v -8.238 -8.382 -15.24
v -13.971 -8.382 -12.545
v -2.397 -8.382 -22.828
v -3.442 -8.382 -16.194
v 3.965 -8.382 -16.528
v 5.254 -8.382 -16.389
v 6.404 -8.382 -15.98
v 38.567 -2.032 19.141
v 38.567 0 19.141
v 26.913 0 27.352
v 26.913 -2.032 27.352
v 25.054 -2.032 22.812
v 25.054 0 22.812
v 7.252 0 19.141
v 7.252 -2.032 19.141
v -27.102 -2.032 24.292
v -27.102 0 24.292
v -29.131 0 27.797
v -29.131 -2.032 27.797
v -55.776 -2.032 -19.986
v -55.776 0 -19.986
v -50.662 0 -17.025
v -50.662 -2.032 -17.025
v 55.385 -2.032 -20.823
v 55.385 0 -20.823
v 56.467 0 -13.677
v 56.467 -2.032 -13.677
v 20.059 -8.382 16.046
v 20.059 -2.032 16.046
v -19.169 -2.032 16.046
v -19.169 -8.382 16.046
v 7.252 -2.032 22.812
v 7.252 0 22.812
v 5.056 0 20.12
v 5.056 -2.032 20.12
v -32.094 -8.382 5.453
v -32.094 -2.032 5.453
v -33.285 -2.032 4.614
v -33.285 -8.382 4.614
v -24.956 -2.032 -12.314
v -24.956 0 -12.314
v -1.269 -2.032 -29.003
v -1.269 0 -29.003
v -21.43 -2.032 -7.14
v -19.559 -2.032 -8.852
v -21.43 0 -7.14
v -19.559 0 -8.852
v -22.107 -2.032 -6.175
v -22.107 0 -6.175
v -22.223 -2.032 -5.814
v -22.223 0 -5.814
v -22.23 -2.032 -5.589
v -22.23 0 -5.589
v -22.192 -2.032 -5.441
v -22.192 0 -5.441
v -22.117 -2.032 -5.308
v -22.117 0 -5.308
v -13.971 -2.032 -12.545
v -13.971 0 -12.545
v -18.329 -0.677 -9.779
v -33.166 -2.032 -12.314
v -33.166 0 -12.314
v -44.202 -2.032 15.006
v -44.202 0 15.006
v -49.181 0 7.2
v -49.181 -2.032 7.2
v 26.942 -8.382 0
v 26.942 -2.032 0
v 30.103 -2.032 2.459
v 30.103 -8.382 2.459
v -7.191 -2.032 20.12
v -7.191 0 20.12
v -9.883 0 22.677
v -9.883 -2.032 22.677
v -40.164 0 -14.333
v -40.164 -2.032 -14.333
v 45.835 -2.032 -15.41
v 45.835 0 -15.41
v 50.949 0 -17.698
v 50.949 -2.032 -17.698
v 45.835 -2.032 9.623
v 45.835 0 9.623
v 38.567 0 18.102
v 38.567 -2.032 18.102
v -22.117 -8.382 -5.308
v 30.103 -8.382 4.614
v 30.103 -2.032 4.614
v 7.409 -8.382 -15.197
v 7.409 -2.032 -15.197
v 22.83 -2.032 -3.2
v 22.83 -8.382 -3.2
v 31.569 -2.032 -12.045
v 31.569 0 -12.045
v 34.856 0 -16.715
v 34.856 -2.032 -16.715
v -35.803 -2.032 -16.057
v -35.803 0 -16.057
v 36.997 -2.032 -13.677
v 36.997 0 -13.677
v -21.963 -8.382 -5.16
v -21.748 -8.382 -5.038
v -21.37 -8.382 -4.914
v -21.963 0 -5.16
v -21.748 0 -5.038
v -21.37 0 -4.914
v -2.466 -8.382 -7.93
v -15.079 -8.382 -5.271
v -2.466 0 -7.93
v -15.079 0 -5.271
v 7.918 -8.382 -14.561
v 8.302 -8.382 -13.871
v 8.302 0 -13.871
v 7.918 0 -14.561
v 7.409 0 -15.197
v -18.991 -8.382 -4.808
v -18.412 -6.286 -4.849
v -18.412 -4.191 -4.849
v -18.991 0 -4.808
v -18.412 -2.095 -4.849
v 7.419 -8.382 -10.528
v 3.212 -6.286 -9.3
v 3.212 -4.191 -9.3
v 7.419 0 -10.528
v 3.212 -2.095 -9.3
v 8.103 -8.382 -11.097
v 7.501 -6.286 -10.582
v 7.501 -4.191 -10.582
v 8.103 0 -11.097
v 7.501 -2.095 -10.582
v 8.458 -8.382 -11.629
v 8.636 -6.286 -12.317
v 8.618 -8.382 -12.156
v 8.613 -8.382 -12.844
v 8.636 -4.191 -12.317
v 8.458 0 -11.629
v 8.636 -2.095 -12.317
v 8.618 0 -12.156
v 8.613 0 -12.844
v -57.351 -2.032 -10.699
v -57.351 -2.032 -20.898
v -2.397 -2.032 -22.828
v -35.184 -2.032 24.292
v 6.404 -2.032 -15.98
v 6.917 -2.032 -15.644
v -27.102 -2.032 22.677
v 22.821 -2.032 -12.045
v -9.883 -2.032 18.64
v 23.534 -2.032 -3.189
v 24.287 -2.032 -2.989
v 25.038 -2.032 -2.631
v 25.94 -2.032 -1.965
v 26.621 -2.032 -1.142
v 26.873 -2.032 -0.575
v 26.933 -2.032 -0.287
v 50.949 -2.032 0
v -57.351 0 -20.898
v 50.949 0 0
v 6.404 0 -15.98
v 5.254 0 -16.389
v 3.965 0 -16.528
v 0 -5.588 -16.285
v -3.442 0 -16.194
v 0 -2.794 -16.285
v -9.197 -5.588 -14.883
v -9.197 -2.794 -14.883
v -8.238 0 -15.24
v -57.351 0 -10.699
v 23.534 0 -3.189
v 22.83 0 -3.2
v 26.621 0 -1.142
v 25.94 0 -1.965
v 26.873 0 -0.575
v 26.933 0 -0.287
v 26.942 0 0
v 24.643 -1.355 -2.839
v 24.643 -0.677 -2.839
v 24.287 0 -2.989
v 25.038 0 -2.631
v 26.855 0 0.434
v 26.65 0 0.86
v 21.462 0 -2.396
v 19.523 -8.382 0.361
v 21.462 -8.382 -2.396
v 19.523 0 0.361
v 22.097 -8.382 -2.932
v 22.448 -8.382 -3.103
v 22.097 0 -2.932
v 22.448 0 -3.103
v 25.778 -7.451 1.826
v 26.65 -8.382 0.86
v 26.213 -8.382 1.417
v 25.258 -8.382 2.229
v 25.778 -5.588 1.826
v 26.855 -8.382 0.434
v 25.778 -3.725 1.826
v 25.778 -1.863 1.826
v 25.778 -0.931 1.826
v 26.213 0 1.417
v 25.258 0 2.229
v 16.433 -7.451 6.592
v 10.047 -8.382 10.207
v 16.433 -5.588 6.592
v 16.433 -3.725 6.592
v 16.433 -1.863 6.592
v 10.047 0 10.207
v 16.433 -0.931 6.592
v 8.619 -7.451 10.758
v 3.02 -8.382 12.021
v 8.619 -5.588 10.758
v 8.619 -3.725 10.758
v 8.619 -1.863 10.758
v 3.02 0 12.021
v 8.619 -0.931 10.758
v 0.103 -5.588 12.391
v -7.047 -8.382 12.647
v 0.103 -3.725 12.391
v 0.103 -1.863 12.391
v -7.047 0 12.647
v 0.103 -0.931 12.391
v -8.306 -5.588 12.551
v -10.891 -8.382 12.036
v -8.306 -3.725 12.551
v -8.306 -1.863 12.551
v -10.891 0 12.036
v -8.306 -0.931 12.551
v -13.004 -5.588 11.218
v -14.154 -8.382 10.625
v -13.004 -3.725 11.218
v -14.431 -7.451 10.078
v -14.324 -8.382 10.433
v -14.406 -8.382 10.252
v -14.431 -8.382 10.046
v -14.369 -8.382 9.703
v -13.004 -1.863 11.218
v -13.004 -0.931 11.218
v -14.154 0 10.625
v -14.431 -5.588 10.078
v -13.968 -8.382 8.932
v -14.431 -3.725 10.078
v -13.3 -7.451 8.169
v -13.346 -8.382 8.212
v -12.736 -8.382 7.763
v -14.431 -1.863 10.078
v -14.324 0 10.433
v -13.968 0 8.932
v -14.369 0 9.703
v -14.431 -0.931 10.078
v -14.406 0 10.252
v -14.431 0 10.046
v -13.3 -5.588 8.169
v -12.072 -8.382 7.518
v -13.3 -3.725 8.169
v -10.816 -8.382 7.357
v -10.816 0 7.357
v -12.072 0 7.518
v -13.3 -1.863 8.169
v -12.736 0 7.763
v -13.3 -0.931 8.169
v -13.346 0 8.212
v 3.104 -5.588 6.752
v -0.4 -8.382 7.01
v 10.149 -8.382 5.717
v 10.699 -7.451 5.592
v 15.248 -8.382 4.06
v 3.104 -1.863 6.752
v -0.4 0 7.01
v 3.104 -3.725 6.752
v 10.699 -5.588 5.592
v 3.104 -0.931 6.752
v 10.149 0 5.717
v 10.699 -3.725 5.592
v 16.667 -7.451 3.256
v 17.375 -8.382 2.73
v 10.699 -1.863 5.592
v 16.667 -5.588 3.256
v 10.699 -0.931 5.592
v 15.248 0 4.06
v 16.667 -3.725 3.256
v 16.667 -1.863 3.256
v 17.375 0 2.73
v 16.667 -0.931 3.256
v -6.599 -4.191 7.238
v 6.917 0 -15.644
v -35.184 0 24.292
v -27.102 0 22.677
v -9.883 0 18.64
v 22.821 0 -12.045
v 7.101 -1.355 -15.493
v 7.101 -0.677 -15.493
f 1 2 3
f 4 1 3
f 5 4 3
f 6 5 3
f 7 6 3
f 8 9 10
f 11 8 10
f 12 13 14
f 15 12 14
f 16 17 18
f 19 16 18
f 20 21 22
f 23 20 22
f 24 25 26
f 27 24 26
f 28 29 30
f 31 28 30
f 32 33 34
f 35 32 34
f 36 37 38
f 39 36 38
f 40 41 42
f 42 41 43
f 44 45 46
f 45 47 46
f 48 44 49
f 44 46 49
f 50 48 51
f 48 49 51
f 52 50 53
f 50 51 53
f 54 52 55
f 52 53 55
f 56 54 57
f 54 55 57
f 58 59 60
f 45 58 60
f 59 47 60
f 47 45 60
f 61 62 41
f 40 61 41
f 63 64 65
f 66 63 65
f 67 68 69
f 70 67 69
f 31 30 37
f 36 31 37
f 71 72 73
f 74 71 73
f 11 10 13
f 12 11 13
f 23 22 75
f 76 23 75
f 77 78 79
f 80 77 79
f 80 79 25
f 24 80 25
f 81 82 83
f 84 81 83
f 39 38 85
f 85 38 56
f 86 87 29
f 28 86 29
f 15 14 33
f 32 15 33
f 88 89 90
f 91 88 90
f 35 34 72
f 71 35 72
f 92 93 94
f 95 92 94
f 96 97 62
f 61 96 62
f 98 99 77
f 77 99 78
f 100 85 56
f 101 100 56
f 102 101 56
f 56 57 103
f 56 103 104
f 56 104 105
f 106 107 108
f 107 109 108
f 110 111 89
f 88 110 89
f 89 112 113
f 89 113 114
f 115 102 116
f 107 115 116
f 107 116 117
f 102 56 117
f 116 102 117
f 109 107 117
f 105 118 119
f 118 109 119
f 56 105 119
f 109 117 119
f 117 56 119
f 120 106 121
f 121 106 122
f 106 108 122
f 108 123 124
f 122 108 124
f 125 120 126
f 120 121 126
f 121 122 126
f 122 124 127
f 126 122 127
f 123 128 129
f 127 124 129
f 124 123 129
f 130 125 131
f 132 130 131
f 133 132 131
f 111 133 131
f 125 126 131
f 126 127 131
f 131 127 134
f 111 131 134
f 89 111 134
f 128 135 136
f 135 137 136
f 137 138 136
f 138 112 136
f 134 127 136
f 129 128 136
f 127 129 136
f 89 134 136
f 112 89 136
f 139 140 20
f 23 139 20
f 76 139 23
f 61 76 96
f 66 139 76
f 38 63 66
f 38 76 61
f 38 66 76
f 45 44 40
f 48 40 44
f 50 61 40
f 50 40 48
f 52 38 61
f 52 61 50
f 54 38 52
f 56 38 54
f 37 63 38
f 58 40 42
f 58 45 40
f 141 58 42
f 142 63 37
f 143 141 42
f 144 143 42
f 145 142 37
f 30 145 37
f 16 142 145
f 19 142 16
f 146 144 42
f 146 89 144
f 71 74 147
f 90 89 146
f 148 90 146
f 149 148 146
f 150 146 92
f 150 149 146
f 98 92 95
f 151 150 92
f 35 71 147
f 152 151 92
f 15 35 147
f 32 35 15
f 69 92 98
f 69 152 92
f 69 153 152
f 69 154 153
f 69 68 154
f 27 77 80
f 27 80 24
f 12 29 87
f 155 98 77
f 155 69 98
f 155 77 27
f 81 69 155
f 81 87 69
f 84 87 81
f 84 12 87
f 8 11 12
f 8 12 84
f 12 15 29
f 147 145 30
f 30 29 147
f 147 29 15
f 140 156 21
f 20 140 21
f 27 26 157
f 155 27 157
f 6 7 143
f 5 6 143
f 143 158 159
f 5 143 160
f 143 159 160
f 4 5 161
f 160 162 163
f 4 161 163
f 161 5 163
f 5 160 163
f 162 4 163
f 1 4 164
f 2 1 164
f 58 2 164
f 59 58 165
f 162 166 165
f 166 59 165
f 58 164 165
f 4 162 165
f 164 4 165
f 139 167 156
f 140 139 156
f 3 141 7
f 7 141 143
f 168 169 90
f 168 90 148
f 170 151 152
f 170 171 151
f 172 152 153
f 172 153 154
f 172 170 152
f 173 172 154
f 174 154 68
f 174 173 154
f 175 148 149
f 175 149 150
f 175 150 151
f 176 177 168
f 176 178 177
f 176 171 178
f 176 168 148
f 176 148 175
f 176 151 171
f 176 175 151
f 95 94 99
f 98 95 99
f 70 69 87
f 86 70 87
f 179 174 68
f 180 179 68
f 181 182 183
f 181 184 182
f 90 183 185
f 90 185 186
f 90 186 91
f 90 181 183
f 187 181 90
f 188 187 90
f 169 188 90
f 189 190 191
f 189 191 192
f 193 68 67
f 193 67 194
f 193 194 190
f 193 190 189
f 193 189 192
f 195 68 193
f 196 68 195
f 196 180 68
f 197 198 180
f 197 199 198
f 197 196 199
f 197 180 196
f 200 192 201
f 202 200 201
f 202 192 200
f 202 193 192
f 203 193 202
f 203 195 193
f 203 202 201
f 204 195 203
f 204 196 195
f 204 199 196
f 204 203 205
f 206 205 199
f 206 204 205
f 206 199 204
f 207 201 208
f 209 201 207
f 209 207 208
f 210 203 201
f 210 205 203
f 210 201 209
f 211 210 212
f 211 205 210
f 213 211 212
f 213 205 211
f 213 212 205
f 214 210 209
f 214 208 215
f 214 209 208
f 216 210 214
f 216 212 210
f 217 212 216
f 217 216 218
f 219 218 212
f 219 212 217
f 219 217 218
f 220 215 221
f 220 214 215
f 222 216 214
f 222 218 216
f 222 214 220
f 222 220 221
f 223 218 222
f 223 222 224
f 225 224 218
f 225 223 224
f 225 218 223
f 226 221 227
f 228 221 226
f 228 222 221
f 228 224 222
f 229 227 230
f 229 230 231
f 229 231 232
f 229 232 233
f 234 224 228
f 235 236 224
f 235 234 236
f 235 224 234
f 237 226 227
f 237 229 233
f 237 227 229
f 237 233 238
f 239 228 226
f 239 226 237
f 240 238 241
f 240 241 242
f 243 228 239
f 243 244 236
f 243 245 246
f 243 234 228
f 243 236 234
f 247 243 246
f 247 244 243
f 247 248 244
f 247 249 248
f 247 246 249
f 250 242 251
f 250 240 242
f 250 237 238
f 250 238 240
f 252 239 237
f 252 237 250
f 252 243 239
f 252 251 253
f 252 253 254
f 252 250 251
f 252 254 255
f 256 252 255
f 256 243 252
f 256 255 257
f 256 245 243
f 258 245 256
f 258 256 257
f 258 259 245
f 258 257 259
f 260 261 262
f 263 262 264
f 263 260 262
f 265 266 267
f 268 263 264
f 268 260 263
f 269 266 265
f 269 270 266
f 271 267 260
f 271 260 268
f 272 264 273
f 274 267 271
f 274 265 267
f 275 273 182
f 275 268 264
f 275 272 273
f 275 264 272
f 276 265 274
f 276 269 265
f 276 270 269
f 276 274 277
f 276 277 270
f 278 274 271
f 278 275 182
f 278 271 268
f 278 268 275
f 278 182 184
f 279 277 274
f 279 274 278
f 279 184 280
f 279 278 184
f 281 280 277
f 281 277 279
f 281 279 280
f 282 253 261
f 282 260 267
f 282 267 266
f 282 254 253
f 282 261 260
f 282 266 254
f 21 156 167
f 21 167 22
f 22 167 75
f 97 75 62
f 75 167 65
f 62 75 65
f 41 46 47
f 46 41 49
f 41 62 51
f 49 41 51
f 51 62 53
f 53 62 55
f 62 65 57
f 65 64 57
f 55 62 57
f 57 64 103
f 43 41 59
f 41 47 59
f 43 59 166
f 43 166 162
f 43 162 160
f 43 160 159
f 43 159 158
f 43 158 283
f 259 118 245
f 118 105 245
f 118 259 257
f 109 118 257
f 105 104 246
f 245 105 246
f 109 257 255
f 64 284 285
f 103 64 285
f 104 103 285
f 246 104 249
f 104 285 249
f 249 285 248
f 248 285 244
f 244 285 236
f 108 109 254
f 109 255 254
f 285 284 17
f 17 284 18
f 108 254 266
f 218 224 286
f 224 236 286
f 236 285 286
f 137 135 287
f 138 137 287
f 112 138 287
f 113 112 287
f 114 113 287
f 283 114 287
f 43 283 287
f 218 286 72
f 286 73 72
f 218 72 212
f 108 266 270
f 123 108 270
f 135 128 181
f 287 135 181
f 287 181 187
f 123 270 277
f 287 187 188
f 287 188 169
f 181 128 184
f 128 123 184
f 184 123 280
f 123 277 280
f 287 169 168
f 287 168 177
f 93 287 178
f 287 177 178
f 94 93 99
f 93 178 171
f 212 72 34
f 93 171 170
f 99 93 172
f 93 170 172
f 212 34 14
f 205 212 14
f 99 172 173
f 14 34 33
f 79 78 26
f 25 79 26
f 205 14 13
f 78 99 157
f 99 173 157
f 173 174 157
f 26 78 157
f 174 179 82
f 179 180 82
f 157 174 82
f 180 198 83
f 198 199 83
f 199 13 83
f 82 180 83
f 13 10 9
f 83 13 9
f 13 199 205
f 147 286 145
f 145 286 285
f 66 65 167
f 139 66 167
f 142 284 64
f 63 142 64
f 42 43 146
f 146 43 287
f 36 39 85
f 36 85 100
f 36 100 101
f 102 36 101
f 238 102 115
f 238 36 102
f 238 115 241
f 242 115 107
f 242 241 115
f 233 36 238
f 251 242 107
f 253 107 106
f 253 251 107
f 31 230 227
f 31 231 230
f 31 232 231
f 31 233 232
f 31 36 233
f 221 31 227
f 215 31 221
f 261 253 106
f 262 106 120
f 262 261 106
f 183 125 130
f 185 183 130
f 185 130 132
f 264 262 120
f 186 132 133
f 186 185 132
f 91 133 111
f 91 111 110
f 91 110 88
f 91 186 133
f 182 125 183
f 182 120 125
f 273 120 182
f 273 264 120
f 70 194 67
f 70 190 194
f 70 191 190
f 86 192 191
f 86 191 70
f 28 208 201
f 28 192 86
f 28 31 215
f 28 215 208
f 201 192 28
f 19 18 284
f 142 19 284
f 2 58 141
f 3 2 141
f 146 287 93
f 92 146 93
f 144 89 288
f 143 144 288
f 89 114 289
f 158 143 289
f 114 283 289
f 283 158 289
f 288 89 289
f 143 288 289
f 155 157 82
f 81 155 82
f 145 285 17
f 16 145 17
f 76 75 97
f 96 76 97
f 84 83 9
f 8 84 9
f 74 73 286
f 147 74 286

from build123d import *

# Parameters (mm, degrees)
F1_DEPTH = 2.032
F2_DEPTH = 8.382


with BuildPart() as f1:
    # F0 (on Front) → F1 (new body)
    with BuildSketch(Plane.XZ):
        Polygon((-33.1656560302, -12.3144071549), (-24.9560493976, -12.3144071549), (-1.2693220051, -29.00278382), (22.8211581707, -12.0452400297), (31.5690971911, -12.0452400297), (34.8564195064, -16.7153251581), (36.9973490829, -13.6765865041), (45.8349697292, -15.409831889), (50.9491488338, -17.6977552474), (55.3847869133, -20.8228639969), (56.4670786262, -13.6765865041), (50.9491488338, 0), (45.8349697292, 9.62273404), (38.5674498975, 18.1015059352), (38.5674498975, 19.1411144212), (26.9129447769, 27.3522432984), (25.0539752738, 22.8119343519), (7.2522702998, 19.1411144212), (7.2522702998, 22.8119343519), (5.056111142, 20.120261237), (-7.1910037659, 20.120261237), (-9.8826773465, 22.6773489267), (-9.8826773465, 18.6398401856), (-27.1023066864, 22.6773489267), (-27.1023066864, 24.2923554033), (-29.1312160043, 27.7968354823), (-35.1844094694, 24.2923554033), (-44.2015193403, 15.0060812011), (-49.1811148822, 7.2002275847), (-57.3513488688, -10.6994034722), (-57.3513488688, -20.897887722), (-55.7757131755, -19.9856776744), (-50.661534071, -17.0248374343), (-40.1640087366, -14.3331624568), (-35.8025580595, -16.0571066866), align=None)
        with BuildLine():
            Line((-19.1693194211, 16.0455666482), (20.0592763722, 16.0455666482))
            Line((20.0592763722, 16.0455666482), (30.1034301519, 4.6142059552))
            Line((30.1034301519, 4.6142059552), (30.1034301519, 2.4593232665))
            Line((30.1034301519, 2.4593232665), (26.9424937972, 0))
            add(Edge.make_bspline(
                [(22.8298229254, -3.1998072809), (24.462241695, -3.4349706597), (27.0395326488, -1.6373986063), (26.9424937972, 0)],
                knots=[0.9184623502, 0.9184623502, 0.9184623502, 0.9184623502, 1, 1, 1, 1], degree=3))
            Line((22.8298229254, -3.1998072809), (7.4094428032, -15.1974229735))
            add(Edge.make_bspline(
                [(7.4094428032, -15.1974229735), (7.1154585621, -15.5071544168), (6.7771867031, -15.7773373426), (6.4039175498, -15.9797581342)],
                knots=[0.4999530393, 0.4999530393, 0.4999530393, 0.4999530393, 0.5270711103, 0.5270711103, 0.5270711103, 0.5270711103], degree=3))
            Line((6.4039175498, -15.9797581342), (-2.3974832147, -22.8275675327))
            Line((-2.3974832147, -22.8275675327), (-13.9708261384, -12.5454063883))
            add(Edge.make_bspline(
                [(-13.9708261384, -12.5454063883), (-18.5719613103, -9.9436120425), (-23.0216929729, -6.50802384), (-22.1168683162, -5.308178656)],
                knots=[0.8545209224, 0.8545209224, 0.8545209224, 0.8545209224, 1, 1, 1, 1], degree=3))
            Line((-22.1168683162, -5.308178656), (-33.2852557897, 4.6142059552))
            Line((-33.2852557897, 4.6142059552), (-32.0940539241, 5.4527055472))
            Line((-32.0940539241, 5.4527055472), (-19.1693194211, 16.0455666482))
        make_face(mode=Mode.SUBTRACT)
    extrude(amount=F1_DEPTH)

    # F0 (on Front) → F2 (join)
    with BuildSketch(Plane.XZ):
        with BuildLine():
            Line((30.1034301519, 4.6142059552), (20.0592763722, 16.0455666482))
            Line((20.0592763722, 16.0455666482), (-19.1693194211, 16.0455666482))
            Line((-19.1693194211, 16.0455666482), (-32.0940539241, 5.4527055472))
            Line((-32.0940539241, 5.4527055472), (-33.2852557897, 4.6142059552))
            Line((-33.2852557897, 4.6142059552), (-22.1168683162, -5.308178656))
            add(Edge.make_bspline(
                [(-22.1168683162, -5.308178656), (-20.5640977138, -3.2491229978), (3.9959390264, -9.6652249084), (7.2520101228, -10.1280816189), (9.145655015, -12.0850009625), (8.2223679986, -14.340953616), (7.4094428032, -15.1974229735)],
                knots=[0, 0, 0, 0, 0.2496568073, 0.3539773818, 0.4249661519, 0.4999530393, 0.4999530393, 0.4999530393, 0.4999530393], degree=3))
            Line((7.4094428032, -15.1974229735), (22.8298229254, -3.1998072809))
            add(Edge.make_bspline(
                [(26.9424937972, 0), (26.7927647819, 2.5264734376), (14.7702586202, 6.4839571334), (9.9927479767, 11.7048966434), (-8.3153461992, 13.4266508013), (-12.6080071816, 11.3357704714), (-15.0688090824, 10.4134312297), (-13.1312061498, 7.6002957892), (-9.960406249, 7.0516420566), (19.275750104, 7.4780233176), (20.6934251658, -2.8920415747), (22.8298229254, -3.1998072809)],
                knots=[0, 0, 0, 0, 0.1258109696, 0.2321042634, 0.3794610791, 0.4583990161, 0.5056043961, 0.5599429381, 0.6264367852, 0.8117514648, 0.9184623502, 0.9184623502, 0.9184623502, 0.9184623502], degree=3))
            Line((26.9424937972, 0), (30.1034301519, 2.4593232665))
            Line((30.1034301519, 2.4593232665), (30.1034301519, 4.6142059552))
        make_face()
        with BuildLine():
            add(Edge.make_bspline(
                [(6.4039175498, -15.9797581342), (4.6855915646, -16.911592182), (-0.7377498155, -15.8000970006), (-5.8350345939, -16.6862025714), (-12.3188815542, -13.47952806), (-13.9708261384, -12.5454063883)],
                knots=[0.5270711103, 0.5270711103, 0.5270711103, 0.5270711103, 0.6519078017, 0.8022896001, 0.8545209224, 0.8545209224, 0.8545209224, 0.8545209224], degree=3))
            Line((-13.9708261384, -12.5454063883), (-2.3974832147, -22.8275675327))
            Line((-2.3974832147, -22.8275675327), (6.4039175498, -15.9797581342))
        make_face()
    extrude(amount=F2_DEPTH)


solid = f1.part
